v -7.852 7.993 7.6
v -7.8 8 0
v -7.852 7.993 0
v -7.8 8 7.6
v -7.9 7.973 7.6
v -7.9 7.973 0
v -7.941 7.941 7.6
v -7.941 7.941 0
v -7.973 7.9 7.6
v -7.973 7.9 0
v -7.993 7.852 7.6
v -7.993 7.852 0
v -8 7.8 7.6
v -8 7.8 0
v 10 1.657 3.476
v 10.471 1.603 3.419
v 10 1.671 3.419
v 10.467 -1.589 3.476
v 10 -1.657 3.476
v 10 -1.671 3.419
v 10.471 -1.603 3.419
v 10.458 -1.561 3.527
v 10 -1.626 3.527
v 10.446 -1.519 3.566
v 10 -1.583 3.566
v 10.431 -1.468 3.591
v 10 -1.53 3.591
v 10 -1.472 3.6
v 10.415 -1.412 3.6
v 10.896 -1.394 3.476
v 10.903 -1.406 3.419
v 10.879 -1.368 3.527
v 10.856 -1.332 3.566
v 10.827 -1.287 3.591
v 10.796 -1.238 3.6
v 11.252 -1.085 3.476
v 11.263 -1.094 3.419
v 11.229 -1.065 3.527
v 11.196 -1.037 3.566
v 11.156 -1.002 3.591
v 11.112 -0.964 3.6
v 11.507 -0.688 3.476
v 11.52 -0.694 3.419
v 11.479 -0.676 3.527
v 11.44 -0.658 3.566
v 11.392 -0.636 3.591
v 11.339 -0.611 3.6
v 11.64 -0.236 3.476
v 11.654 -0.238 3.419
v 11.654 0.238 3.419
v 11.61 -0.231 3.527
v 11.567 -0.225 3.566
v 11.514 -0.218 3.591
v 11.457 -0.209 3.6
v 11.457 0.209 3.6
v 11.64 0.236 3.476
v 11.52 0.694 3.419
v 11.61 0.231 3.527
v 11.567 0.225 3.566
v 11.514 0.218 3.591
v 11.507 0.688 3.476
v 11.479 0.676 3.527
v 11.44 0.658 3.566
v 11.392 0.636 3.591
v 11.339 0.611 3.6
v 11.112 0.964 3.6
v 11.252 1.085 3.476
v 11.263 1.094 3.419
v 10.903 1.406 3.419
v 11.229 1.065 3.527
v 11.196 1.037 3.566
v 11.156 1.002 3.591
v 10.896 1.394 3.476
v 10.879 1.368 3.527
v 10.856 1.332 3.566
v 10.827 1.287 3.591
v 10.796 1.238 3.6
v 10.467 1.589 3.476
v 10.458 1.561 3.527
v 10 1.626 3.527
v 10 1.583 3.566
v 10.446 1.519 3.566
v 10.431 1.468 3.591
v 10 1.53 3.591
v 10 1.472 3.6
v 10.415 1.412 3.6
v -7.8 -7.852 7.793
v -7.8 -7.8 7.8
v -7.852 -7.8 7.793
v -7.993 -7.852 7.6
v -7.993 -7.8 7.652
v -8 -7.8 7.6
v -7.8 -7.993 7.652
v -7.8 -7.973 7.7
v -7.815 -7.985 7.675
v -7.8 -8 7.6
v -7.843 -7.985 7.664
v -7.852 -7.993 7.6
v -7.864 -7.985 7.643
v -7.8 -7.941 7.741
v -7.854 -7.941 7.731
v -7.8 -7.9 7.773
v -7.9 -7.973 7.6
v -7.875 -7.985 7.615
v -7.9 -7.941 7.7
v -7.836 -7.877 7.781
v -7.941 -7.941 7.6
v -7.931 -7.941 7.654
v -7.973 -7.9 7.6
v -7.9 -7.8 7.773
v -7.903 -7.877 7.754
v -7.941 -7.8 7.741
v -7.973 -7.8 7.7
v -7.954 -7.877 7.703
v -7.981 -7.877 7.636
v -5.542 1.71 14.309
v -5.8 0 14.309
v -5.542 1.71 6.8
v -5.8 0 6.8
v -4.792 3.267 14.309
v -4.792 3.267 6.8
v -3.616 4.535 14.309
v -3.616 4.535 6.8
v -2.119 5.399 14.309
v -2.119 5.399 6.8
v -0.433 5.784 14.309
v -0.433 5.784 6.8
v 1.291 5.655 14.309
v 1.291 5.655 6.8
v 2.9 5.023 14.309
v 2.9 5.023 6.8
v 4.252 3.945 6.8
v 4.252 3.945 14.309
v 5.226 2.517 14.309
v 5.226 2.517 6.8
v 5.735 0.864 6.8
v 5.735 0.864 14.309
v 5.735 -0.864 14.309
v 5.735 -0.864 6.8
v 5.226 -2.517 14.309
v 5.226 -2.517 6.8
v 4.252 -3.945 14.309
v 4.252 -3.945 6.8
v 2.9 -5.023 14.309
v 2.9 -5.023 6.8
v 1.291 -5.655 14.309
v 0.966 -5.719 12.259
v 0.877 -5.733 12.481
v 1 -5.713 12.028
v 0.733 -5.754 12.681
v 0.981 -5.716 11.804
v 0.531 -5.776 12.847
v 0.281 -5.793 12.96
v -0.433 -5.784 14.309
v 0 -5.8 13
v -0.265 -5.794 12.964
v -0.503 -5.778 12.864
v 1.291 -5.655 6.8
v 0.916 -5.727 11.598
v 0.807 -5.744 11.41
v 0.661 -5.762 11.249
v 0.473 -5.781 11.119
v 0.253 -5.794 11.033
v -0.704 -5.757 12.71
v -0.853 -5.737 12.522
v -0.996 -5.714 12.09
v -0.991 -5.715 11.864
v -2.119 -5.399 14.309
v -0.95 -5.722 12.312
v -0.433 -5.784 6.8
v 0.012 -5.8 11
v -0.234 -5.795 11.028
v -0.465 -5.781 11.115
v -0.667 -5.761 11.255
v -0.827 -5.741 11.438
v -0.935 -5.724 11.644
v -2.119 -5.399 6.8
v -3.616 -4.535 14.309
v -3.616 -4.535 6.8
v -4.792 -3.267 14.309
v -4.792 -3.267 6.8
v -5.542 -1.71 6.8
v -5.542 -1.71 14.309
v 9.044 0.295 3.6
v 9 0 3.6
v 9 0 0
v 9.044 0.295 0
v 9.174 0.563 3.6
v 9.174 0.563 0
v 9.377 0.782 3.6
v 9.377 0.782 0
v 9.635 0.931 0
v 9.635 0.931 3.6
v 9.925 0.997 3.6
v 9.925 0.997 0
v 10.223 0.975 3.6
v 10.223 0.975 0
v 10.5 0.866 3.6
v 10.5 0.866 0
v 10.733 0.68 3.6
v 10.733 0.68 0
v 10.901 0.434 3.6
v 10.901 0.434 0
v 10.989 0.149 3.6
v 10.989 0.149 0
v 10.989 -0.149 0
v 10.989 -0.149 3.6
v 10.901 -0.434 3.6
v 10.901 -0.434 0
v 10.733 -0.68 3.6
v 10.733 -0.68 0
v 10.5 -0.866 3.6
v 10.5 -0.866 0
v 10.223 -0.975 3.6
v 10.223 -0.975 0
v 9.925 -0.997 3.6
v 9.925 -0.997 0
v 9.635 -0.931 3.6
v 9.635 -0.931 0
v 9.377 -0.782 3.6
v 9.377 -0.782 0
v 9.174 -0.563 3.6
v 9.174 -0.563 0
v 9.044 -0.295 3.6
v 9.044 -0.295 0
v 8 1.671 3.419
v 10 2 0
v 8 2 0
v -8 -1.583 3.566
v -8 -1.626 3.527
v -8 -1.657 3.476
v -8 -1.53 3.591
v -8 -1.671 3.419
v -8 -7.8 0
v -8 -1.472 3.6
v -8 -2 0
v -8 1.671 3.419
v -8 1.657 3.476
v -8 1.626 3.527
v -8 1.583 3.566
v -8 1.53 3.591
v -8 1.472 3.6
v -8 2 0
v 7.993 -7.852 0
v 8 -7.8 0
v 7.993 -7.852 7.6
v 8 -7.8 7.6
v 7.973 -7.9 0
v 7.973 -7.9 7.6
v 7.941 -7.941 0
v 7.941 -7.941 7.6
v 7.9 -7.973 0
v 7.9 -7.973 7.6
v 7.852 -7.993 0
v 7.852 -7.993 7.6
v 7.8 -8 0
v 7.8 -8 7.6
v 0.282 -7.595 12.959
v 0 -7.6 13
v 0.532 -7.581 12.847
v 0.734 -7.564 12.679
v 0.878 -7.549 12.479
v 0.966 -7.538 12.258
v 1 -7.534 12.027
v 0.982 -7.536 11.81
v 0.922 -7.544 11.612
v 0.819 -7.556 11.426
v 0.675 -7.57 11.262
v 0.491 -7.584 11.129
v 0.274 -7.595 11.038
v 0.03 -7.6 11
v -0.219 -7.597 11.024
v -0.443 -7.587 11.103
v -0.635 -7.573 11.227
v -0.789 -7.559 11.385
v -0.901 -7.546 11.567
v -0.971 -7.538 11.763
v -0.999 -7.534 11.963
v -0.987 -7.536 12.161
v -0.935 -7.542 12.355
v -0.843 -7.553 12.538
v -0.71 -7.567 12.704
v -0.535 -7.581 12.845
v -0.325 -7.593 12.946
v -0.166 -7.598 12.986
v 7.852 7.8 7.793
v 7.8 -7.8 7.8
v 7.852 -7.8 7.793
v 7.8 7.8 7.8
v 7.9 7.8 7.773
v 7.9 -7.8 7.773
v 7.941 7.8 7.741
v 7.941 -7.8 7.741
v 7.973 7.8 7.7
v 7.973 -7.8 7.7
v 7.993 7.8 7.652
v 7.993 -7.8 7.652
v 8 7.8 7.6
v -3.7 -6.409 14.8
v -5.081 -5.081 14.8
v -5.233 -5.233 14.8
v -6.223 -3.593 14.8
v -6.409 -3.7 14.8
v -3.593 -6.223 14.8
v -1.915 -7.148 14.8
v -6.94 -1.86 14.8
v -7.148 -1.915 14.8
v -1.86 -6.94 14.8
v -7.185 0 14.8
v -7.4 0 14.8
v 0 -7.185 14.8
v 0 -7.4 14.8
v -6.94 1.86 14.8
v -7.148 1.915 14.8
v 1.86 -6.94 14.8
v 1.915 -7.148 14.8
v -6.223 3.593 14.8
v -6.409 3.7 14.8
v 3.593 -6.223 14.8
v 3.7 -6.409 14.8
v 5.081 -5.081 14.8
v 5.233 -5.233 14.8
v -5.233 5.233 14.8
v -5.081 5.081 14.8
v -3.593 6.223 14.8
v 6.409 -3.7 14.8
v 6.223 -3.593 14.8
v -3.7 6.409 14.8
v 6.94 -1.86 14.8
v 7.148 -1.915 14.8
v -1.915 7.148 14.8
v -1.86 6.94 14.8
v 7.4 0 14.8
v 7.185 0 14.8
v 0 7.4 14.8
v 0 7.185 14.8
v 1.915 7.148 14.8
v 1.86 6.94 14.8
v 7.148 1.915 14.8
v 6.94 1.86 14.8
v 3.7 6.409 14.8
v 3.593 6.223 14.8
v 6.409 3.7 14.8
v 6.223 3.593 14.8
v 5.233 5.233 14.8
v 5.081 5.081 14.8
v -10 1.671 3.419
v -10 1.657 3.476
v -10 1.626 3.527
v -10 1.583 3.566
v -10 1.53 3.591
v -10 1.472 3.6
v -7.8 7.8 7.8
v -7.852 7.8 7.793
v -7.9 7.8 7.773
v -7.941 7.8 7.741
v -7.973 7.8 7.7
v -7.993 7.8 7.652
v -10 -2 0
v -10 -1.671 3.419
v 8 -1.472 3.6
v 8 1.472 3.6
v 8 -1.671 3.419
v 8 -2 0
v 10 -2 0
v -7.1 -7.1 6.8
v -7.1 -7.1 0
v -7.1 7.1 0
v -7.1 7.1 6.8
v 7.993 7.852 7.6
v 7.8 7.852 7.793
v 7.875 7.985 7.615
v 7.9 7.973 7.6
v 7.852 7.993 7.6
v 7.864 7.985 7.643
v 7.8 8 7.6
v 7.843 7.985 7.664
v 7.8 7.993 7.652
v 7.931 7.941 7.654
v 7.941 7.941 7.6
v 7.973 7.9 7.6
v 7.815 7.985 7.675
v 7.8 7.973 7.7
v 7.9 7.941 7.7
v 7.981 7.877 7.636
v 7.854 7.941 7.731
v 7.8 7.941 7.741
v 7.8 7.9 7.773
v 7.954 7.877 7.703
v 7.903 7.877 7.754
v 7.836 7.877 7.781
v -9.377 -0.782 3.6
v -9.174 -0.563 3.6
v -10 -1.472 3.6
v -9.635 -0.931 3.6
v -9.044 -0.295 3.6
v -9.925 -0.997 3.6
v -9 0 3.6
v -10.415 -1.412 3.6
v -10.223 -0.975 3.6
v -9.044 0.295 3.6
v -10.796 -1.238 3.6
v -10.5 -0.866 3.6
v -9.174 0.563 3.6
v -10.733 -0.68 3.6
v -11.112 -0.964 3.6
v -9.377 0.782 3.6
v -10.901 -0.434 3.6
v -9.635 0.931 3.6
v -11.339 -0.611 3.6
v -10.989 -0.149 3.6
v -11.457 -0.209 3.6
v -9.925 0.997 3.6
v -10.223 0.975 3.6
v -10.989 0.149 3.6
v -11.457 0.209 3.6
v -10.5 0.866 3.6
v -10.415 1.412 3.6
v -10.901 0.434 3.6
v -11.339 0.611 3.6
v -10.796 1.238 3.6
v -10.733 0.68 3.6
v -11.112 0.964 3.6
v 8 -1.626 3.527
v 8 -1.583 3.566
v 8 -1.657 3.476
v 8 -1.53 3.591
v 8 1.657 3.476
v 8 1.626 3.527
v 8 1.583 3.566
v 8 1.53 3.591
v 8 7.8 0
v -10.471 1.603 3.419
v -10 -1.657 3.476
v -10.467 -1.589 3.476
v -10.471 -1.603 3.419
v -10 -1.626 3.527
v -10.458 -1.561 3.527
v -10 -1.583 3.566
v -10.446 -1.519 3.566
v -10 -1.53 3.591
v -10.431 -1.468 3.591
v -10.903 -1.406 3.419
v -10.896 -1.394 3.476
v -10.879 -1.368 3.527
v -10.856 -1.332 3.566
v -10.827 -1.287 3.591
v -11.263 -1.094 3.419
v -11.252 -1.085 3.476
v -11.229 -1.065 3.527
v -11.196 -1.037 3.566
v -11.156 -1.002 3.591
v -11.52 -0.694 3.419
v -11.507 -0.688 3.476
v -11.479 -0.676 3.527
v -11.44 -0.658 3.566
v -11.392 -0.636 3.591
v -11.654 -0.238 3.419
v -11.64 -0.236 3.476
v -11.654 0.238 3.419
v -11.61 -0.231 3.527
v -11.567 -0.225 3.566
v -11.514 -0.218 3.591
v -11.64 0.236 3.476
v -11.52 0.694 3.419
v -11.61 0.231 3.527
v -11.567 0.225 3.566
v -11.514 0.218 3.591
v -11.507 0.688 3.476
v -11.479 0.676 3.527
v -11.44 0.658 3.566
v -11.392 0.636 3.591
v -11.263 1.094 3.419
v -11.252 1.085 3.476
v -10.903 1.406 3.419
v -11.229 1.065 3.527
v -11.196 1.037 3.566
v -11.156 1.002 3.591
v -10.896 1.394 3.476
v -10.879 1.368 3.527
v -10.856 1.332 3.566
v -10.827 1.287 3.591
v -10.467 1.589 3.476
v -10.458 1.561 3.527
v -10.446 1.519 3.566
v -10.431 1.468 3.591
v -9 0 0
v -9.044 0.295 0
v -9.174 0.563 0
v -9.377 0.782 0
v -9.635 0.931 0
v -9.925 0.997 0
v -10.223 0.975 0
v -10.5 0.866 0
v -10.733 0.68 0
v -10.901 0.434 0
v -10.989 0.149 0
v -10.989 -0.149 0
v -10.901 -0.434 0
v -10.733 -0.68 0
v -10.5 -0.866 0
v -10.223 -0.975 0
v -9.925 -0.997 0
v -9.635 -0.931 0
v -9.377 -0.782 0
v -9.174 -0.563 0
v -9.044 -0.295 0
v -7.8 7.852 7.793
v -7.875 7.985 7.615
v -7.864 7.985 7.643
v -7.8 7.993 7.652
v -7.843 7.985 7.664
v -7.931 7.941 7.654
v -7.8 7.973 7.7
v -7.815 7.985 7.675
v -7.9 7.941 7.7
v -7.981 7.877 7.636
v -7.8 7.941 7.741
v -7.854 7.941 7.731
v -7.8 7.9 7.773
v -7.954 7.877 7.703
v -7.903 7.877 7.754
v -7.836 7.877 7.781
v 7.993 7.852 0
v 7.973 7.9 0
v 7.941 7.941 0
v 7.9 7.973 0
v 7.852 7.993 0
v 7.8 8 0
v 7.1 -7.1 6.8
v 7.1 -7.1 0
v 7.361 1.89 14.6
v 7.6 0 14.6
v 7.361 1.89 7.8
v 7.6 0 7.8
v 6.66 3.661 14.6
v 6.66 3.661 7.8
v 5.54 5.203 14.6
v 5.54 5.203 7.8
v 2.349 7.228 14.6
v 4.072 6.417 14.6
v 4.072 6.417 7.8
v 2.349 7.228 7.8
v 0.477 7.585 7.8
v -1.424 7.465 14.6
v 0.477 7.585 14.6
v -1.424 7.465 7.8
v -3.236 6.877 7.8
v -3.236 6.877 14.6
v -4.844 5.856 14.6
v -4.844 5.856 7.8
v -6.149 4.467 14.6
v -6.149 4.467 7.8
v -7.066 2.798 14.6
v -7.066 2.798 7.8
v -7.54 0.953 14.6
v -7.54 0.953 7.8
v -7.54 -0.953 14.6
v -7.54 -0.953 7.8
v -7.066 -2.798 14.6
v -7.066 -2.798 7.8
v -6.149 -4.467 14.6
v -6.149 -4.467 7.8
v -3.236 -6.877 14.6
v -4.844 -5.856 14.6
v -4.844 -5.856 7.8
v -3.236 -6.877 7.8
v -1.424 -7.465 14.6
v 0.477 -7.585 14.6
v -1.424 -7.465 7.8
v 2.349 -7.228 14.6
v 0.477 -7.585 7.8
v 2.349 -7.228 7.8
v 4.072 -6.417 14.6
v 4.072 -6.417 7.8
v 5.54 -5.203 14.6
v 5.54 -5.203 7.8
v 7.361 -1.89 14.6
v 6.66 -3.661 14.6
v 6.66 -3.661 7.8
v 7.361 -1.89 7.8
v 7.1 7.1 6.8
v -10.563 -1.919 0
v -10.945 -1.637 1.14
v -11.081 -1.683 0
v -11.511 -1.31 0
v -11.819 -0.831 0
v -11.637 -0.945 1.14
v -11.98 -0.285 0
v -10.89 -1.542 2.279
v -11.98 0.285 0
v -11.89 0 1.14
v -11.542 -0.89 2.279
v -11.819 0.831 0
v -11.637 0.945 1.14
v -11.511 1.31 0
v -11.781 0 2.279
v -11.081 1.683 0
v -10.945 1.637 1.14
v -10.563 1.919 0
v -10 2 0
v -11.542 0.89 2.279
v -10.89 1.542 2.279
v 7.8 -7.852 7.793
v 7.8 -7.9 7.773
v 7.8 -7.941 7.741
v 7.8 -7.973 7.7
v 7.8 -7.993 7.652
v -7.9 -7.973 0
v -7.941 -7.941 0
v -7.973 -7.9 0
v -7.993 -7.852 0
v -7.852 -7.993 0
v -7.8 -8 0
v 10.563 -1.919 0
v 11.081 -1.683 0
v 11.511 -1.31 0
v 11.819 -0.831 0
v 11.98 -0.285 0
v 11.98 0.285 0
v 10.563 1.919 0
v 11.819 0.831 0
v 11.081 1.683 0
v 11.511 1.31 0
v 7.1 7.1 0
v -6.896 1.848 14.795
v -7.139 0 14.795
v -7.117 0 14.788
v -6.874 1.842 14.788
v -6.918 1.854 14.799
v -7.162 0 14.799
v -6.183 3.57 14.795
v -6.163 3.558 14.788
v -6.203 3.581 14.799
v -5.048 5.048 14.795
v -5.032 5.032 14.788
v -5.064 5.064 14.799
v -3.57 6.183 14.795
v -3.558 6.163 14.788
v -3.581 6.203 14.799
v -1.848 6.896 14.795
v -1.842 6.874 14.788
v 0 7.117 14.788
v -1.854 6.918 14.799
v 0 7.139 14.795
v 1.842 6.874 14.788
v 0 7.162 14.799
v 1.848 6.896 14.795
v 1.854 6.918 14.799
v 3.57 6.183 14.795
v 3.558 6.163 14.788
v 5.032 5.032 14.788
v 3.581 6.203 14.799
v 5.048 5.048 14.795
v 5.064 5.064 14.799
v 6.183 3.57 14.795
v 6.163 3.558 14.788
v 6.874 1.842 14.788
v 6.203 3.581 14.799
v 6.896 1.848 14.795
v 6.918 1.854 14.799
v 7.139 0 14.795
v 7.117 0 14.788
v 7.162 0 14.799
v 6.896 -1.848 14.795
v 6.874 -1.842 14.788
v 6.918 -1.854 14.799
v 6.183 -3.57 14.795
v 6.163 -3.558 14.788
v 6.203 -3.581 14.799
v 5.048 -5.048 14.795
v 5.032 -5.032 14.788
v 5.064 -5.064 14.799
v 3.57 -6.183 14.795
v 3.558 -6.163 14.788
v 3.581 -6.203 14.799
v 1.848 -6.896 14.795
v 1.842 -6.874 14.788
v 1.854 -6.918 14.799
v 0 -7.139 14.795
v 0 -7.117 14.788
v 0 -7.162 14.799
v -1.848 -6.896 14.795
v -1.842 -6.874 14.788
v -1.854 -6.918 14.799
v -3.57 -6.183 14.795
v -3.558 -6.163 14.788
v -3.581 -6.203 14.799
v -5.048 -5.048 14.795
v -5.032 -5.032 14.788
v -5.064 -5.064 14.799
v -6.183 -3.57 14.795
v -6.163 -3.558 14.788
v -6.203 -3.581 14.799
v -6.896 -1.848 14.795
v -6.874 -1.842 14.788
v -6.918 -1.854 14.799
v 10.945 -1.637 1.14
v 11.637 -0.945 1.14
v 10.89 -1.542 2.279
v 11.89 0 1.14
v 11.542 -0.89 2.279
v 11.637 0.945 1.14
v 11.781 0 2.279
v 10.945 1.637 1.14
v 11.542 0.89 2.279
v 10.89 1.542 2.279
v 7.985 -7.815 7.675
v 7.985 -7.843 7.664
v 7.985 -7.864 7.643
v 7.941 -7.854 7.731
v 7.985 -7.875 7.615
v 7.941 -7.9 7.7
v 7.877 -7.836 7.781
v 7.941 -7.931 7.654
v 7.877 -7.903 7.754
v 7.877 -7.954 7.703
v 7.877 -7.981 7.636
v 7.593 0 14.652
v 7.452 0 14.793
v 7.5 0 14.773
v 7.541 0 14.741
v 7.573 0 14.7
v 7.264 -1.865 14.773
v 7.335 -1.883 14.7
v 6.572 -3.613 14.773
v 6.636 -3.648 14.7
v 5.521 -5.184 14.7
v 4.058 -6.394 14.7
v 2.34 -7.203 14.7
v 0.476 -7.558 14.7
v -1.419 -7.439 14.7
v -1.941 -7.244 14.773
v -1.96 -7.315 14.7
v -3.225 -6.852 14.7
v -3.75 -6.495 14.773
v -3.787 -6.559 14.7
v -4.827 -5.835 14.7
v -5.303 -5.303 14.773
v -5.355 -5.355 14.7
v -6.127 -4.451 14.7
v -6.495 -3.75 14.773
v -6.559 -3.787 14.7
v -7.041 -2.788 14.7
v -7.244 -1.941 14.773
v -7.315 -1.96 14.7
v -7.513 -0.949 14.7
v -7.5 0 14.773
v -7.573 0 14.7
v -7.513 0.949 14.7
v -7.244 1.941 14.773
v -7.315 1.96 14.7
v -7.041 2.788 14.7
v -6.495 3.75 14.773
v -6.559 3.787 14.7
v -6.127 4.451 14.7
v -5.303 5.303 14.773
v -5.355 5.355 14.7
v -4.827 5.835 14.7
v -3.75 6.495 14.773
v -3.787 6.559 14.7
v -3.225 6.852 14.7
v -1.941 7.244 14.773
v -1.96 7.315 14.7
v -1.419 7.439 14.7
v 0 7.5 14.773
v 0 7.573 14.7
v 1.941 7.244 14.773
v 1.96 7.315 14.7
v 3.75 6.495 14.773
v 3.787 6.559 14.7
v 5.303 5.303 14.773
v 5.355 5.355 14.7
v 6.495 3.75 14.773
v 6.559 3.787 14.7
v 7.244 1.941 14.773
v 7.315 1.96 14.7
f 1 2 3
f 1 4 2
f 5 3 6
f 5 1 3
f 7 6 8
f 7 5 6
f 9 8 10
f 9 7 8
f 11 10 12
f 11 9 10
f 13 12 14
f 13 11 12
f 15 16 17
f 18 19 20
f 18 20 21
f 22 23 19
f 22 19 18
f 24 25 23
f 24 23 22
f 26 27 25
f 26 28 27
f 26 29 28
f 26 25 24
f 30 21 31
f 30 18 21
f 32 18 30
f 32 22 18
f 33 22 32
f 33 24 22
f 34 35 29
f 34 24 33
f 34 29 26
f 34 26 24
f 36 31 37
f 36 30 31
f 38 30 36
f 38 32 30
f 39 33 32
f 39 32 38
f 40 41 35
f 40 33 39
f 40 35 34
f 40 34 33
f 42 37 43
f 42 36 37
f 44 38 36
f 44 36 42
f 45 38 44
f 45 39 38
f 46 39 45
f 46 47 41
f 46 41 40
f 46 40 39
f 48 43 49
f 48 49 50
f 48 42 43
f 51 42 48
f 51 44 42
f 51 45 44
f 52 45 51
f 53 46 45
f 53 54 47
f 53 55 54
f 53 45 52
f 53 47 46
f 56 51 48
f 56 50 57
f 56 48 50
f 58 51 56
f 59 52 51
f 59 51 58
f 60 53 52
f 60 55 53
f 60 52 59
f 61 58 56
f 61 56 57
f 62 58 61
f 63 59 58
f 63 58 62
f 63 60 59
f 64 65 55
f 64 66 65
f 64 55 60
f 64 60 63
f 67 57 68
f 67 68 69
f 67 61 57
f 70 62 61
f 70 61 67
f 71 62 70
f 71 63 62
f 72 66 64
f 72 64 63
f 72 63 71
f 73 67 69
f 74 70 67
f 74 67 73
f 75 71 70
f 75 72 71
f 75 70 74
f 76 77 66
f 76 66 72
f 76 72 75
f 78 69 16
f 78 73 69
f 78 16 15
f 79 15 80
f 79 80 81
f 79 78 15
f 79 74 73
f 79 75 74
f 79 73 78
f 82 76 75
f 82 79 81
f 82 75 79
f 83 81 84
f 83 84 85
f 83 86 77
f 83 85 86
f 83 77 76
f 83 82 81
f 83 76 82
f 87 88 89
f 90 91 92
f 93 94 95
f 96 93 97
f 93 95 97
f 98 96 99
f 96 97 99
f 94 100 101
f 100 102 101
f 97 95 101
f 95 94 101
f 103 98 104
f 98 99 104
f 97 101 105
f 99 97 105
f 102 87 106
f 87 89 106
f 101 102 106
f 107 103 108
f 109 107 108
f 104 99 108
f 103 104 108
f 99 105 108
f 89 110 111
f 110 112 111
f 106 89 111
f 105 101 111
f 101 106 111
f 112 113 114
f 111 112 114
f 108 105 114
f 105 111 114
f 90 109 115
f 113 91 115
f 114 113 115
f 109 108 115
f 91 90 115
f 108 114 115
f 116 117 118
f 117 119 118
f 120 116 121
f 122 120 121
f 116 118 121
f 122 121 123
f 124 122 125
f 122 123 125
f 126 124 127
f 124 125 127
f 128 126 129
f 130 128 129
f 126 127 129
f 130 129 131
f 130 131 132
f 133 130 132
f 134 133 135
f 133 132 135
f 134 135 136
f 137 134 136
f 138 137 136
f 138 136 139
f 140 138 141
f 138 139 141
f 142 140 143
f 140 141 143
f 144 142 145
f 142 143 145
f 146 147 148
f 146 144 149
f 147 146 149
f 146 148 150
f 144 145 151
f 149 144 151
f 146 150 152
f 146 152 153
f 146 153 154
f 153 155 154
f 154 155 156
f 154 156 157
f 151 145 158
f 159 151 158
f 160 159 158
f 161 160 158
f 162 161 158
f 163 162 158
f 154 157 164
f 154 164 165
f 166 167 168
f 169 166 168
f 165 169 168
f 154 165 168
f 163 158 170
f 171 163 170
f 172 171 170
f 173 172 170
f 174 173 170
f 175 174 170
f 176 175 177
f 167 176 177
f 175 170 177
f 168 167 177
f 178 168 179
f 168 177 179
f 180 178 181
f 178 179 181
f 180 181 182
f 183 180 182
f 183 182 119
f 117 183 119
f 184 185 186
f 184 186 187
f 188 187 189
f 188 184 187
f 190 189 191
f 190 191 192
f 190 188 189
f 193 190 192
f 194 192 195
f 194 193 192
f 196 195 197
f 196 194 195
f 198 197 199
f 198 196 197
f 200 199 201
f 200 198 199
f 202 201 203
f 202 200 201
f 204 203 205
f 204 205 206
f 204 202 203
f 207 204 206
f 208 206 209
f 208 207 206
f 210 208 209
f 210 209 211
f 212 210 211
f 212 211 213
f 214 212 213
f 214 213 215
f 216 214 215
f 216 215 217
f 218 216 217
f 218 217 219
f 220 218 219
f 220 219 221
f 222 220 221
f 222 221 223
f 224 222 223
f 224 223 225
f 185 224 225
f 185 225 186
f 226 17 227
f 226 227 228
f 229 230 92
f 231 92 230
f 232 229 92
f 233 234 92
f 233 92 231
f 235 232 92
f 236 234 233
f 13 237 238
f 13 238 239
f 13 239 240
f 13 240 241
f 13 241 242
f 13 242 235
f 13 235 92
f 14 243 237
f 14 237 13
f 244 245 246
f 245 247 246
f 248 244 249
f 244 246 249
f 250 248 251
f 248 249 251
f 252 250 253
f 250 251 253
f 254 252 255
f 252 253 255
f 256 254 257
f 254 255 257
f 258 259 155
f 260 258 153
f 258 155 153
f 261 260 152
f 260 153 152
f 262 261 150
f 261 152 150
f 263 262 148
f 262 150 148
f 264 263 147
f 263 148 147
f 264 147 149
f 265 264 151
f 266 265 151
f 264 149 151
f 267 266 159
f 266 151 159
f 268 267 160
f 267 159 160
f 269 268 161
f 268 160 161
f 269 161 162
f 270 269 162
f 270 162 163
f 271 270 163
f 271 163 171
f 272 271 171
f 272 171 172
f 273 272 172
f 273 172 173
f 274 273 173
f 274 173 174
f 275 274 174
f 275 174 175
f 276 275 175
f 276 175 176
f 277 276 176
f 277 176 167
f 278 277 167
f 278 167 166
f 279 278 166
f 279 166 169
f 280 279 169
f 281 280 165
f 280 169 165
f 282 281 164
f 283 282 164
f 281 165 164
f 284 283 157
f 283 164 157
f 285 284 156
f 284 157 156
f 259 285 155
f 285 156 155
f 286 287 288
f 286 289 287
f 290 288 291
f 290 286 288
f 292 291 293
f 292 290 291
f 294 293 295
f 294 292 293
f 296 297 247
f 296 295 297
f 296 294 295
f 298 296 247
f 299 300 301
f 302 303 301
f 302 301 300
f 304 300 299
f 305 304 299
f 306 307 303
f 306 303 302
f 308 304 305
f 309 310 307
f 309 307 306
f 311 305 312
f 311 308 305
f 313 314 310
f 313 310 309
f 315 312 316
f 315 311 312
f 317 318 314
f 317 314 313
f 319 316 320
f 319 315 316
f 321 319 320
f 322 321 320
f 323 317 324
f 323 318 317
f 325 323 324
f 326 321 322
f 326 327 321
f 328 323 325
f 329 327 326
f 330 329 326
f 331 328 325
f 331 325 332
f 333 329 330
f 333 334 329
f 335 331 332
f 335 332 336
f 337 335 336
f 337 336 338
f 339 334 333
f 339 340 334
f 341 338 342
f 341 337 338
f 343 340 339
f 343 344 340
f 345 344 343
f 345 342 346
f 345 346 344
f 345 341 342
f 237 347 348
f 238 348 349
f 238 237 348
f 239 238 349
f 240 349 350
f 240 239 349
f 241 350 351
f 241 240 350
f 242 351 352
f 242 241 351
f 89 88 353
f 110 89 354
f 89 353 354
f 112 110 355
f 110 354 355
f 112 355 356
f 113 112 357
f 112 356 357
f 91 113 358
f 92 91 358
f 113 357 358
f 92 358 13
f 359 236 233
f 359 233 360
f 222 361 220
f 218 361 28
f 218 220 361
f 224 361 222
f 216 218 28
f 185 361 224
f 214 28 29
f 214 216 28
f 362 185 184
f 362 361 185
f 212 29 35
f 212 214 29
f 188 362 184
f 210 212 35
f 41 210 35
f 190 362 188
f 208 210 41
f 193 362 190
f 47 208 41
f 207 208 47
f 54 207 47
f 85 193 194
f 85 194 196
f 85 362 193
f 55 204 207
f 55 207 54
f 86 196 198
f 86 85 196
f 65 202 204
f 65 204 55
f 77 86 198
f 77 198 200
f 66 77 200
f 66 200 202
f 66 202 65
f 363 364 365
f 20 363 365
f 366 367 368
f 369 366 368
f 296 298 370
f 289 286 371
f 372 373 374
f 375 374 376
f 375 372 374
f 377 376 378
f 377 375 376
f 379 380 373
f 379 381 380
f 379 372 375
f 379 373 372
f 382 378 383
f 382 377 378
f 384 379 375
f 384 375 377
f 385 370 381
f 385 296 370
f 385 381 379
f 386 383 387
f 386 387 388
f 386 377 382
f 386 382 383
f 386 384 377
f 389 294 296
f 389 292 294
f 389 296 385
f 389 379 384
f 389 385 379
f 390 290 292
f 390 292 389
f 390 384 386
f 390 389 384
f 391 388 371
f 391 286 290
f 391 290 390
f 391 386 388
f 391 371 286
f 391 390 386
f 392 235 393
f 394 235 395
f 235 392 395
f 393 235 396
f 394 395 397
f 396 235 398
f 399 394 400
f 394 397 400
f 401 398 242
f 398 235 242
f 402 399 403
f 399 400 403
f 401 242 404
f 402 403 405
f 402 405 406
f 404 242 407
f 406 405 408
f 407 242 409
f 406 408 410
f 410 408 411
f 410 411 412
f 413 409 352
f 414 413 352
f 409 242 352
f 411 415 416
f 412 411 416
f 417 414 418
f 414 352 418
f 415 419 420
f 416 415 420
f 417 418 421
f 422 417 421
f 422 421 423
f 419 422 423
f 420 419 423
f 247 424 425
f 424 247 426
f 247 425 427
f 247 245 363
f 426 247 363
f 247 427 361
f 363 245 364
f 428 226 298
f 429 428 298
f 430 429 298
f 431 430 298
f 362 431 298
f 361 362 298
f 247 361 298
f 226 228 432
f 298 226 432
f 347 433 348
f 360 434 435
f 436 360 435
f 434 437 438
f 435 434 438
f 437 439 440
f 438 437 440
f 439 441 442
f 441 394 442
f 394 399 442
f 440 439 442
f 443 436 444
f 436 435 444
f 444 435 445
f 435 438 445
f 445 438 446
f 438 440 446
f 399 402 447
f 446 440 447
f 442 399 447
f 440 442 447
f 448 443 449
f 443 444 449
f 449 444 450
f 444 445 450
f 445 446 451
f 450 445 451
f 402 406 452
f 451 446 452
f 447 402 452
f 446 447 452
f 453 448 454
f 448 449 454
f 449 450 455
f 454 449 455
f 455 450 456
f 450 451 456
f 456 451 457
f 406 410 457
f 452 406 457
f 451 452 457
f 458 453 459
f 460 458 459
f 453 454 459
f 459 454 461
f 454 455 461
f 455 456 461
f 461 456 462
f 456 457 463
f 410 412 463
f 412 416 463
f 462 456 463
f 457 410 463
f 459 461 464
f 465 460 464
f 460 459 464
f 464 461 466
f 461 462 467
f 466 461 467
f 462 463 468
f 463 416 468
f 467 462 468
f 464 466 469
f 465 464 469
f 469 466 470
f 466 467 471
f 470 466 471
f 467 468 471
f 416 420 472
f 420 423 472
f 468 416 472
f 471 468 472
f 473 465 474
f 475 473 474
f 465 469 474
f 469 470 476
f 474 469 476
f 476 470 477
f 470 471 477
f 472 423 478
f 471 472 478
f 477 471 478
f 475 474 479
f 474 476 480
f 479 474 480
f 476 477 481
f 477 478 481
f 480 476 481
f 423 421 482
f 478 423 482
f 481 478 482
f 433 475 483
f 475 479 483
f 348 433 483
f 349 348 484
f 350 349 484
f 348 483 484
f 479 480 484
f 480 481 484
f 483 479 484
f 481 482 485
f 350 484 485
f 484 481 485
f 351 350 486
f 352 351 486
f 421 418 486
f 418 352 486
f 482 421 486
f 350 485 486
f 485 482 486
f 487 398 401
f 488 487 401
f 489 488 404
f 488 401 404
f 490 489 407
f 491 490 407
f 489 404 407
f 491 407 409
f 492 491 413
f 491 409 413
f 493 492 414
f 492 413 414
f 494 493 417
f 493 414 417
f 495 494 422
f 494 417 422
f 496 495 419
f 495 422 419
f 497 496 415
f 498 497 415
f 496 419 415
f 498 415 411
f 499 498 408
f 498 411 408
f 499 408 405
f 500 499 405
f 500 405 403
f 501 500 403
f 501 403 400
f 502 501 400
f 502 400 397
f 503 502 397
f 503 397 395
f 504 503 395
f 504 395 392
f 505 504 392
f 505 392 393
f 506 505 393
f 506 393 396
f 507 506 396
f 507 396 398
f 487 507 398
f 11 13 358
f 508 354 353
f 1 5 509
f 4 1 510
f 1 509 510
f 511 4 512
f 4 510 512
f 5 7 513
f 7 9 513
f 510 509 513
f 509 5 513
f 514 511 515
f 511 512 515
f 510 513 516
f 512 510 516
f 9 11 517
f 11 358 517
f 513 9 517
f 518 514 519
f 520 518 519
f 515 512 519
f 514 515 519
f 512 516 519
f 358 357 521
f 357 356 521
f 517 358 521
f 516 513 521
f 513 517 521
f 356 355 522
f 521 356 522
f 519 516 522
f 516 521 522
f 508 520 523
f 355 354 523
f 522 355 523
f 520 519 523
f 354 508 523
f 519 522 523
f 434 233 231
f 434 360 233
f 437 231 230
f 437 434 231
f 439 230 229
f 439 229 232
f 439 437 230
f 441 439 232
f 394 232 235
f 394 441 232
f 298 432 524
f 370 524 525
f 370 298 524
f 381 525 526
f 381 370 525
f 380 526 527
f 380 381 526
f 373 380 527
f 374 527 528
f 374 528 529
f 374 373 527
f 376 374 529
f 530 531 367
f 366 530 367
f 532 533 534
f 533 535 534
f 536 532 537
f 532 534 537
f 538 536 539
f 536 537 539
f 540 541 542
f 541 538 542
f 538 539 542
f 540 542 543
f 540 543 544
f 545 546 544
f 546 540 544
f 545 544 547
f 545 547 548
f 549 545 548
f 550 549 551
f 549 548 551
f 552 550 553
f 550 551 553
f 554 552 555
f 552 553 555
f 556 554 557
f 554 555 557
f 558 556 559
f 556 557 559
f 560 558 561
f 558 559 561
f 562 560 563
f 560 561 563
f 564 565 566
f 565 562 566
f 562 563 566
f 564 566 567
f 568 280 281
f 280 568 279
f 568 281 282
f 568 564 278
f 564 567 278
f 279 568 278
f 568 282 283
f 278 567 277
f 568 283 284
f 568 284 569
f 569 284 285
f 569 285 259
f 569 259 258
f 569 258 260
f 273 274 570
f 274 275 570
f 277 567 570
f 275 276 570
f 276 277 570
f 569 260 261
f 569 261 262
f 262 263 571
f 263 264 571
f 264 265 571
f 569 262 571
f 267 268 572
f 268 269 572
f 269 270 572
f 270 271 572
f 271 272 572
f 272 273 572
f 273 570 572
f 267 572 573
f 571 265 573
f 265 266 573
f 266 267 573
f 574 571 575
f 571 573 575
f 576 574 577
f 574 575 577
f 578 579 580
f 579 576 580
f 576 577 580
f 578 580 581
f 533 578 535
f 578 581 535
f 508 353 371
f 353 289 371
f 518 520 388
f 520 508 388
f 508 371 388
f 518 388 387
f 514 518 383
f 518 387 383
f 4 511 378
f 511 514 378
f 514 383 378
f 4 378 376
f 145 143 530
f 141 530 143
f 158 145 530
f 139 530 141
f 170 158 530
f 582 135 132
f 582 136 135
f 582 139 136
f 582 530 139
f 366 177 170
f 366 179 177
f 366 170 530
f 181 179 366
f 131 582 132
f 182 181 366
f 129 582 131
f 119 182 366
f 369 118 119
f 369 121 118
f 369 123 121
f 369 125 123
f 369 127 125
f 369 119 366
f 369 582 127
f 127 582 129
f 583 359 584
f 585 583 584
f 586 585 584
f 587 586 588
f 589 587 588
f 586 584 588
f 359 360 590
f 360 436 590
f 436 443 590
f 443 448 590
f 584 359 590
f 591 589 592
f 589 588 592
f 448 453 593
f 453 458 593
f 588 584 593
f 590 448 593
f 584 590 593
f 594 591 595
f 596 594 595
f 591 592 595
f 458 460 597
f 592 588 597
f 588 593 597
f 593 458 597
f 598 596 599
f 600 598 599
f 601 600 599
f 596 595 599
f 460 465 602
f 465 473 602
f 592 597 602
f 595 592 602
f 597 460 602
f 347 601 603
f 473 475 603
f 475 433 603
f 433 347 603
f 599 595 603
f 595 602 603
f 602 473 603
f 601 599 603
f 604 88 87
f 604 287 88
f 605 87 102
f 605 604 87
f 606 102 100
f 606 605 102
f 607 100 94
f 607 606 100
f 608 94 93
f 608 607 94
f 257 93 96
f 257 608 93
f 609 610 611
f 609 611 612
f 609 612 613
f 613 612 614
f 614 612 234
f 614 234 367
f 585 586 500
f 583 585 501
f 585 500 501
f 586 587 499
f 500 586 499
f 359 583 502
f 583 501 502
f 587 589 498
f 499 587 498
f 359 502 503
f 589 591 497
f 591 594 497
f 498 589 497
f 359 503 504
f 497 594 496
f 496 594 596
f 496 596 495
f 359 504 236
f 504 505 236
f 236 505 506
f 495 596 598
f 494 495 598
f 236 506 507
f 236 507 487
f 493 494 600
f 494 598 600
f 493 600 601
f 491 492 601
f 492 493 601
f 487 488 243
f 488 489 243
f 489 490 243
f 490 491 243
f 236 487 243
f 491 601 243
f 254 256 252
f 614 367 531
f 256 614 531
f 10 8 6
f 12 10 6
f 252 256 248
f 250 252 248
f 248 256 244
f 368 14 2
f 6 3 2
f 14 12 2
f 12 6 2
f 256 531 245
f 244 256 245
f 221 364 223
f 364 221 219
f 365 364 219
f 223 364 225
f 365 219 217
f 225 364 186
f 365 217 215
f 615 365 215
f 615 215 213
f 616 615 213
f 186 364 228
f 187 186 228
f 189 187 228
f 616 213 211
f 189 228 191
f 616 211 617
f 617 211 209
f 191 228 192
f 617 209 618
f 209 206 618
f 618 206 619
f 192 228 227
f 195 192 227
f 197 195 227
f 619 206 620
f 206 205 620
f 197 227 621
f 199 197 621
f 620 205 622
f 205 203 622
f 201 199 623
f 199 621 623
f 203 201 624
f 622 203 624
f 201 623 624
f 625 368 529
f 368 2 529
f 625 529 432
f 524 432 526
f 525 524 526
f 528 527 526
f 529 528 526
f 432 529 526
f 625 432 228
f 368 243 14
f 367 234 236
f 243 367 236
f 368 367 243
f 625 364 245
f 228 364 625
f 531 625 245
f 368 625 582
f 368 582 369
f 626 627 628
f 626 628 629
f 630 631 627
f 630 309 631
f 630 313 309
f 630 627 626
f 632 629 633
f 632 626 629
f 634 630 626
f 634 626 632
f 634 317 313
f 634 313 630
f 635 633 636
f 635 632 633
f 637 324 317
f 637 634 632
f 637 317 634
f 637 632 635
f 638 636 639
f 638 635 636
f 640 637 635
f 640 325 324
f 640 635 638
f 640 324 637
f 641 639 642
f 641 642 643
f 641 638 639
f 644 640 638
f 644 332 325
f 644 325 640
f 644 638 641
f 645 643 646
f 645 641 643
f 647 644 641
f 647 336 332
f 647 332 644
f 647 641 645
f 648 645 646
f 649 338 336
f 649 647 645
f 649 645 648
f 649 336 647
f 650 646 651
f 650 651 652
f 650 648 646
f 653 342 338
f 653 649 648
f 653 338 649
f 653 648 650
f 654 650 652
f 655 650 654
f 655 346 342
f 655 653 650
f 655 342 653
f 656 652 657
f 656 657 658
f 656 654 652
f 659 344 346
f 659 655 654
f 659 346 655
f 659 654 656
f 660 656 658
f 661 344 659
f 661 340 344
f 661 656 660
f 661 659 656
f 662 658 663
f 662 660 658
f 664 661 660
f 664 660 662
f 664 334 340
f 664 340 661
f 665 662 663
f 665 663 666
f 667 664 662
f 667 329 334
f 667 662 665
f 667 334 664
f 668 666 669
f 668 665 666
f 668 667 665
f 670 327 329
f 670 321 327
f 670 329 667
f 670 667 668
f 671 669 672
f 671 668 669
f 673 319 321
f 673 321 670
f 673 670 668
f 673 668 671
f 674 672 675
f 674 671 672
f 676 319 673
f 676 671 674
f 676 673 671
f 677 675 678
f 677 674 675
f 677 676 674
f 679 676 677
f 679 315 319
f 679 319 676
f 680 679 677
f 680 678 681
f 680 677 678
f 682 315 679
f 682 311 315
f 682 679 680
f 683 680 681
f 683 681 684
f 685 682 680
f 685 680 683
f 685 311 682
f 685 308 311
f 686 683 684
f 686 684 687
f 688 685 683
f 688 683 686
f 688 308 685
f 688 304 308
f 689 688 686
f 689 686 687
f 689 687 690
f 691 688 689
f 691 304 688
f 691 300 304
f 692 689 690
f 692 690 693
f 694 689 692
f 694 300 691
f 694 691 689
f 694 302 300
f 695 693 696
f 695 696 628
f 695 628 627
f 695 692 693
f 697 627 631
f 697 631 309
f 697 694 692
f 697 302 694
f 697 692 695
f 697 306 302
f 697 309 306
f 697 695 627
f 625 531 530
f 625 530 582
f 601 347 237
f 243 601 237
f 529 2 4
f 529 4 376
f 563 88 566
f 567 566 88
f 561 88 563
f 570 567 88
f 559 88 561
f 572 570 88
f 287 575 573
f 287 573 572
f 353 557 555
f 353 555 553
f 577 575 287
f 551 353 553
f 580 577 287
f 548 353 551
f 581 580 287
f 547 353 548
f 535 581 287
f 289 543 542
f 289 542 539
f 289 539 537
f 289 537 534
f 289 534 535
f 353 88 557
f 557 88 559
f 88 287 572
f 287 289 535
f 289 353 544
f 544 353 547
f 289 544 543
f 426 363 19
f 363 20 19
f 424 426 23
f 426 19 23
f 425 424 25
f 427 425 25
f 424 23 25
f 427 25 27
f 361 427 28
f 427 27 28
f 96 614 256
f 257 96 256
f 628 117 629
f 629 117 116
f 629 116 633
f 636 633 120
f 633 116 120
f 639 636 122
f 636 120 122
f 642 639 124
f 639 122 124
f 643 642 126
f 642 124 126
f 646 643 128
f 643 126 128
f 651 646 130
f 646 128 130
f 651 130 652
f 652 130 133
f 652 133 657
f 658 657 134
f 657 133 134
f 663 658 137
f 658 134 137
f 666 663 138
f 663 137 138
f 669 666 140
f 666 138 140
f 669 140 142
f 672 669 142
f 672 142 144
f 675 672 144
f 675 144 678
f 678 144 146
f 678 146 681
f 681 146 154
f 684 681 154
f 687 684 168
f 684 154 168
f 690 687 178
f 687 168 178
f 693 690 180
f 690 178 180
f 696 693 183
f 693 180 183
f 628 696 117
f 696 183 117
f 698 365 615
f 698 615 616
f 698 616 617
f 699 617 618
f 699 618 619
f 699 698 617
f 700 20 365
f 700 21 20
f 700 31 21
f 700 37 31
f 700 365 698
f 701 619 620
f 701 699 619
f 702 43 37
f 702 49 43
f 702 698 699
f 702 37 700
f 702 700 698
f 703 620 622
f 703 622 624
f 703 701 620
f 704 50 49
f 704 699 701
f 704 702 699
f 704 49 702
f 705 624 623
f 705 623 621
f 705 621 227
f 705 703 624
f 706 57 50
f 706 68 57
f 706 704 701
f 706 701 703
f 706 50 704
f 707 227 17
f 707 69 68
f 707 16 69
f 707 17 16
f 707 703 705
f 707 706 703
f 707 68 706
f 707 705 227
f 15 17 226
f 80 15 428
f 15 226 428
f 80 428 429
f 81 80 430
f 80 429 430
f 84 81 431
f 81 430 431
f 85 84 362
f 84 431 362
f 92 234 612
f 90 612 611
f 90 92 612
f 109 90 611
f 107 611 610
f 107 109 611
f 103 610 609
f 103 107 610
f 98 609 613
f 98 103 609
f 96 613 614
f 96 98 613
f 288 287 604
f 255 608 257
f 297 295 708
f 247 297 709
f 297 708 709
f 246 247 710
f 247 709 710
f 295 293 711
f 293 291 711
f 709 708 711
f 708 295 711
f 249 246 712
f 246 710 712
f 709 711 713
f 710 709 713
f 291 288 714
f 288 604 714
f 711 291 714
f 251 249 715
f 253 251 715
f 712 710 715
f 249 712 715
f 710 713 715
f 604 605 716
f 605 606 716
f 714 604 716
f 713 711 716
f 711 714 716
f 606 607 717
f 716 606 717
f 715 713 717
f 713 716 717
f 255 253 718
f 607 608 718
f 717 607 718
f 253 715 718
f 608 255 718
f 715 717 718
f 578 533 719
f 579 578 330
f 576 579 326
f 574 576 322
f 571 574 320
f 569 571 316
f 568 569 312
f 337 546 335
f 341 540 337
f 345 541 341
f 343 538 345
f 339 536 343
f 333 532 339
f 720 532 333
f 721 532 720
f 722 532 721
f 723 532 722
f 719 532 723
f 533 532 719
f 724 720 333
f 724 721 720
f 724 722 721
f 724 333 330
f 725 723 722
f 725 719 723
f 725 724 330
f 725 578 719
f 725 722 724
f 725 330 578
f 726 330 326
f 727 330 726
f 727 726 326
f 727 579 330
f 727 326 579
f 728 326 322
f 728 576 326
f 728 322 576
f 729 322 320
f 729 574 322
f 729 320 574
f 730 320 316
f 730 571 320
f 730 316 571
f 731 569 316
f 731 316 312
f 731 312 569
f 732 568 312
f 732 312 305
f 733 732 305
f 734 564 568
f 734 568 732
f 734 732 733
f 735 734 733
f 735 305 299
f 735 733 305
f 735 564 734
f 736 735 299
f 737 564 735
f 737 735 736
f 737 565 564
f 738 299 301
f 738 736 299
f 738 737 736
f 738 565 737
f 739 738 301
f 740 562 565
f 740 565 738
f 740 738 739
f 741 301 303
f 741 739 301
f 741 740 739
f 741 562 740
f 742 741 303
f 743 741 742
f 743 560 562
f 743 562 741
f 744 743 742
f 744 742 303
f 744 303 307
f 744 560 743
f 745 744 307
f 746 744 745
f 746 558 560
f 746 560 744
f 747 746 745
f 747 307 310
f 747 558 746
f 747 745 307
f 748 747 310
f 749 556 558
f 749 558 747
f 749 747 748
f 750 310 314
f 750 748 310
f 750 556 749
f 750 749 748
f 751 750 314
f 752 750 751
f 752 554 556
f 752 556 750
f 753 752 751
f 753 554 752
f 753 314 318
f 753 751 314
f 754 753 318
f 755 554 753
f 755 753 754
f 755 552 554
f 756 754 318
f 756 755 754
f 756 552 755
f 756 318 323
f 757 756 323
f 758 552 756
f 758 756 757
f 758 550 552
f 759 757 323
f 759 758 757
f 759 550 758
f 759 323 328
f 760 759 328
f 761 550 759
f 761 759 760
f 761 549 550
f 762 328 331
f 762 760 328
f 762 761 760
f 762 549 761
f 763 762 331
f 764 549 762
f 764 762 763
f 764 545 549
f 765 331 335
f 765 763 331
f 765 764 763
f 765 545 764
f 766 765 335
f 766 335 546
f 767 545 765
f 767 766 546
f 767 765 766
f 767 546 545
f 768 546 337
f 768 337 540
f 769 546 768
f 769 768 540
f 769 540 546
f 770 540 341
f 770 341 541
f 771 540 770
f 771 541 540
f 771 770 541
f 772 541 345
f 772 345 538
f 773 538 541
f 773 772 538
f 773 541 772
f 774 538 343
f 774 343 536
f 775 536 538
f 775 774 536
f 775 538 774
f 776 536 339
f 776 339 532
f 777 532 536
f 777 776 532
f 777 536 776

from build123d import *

# Parameters (mm, degrees)
SKETCH_1_W             = 16
SKETCH_1_H             = 16
EXTRUDE_1_DEPTH        = 7.8
SKETCH_2_R             = 7.6
EXTRUDE_2_DEPTH        = 7
EXTRUDE_3_DEPTH        = 3.6
EXTRUDE_3_TAPER        = 5.5
SKETCH_4_R             = 1
CUT_EXTRUDE_1_DEPTH    = 19.260339646
FILLET_1_R             = 0.2
FILLET_1_OF_MIRROR_1_R = 0.2
SKETCH_5_W             = 14.2
SKETCH_5_H             = 14.2
CUT_EXTRUDE_2_DEPTH    = 6.8
SKETCH_6_R             = 5.8
CUT_EXTRUDE_3_DEPTH    = 17.492422624
CHAMFER_1_SIZE         = 1.35
CHAMFER_1_SIZE2        = 0.491359816
FILLET_2_R             = 0.2
SKETCH_7_R             = 1
CUT_EXTRUDE_4_DEPTH    = 21.664946262
FILLET_3_R             = 0.2


with BuildPart() as part:
    # 草图1 → 凸台-拉伸1 (new body)
    with BuildSketch(Plane.XY):
        Rectangle(SKETCH_1_W, SKETCH_1_H)
    extrude(amount=EXTRUDE_1_DEPTH)

    # 草图2 → 凸台-拉伸2 (add)
    with BuildSketch(Plane.XY.offset(7.8)):
        Circle(SKETCH_2_R)
    extrude(amount=EXTRUDE_2_DEPTH)

    # 草图3 → 凸台-拉伸3 (add)
    with BuildSketch(Plane(origin=(0, 0, 0), x_dir=(-1, 0, 0), z_dir=(0, 0, -1))):
        with BuildLine():
            Line((10, 2), (4, 2))
            Line((4, 2), (4, -2))
            Line((4, -2), (10, -2))
            ThreePointArc((10, -2), (12, 0), (10, 2))
        make_face()
    extrude_3 = extrude(amount=-EXTRUDE_3_DEPTH, taper=EXTRUDE_3_TAPER)

    # 草图4 → 切除-拉伸1 (cut, through all)
    with BuildSketch(Plane.XY.offset(3.6)):
        with Locations((-10, 0)):
            Circle(SKETCH_4_R)
    cut_extrude_1 = extrude(amount=-CUT_EXTRUDE_1_DEPTH, mode=Mode.SUBTRACT)

    # 圆角1
    fillet_1_edges = [part.edges().sort_by_distance(p)[0] for p in [
        (-9, 1.653359426, 3.6),
        (-11.653359426, 0, 3.6),
        (-9, -1.653359426, 3.6),
    ]]
    fillet(fillet_1_edges, radius=FILLET_1_R)

    # 镜向1: 凸台-拉伸3, 切除-拉伸1 across plane
    add(extrude_3.mirror(Plane(origin=(0, 0, 0), x_dir=(0, 0, 1), z_dir=(1, 0, 0))))
    add(cut_extrude_1.mirror(Plane(origin=(0, 0, 0), x_dir=(0, 0, 1), z_dir=(1, 0, 0))), mode=Mode.SUBTRACT)

    # 圆角1 of 镜向1
    fillet_1_of_mirror_1_edges = [part.edges().sort_by_distance(p)[0] for p in [
        (9, 1.653359426, 3.6),
        (11.653359426, 0, 3.6),
        (9, -1.653359426, 3.6),
    ]]
    fillet(fillet_1_of_mirror_1_edges, radius=FILLET_1_OF_MIRROR_1_R)

    # 草图5 → 切除-拉伸2 (cut)
    with BuildSketch(Plane(origin=(0, 0, 0), x_dir=(-1, 0, 0), z_dir=(0, 0, -1))):
        Rectangle(SKETCH_5_W, SKETCH_5_H)
    extrude(amount=-CUT_EXTRUDE_2_DEPTH, mode=Mode.SUBTRACT)

    # 草图6 → 切除-拉伸3 (cut, through all)
    with BuildSketch(Plane(origin=(0, 0, 6.8), x_dir=(-1, 0, 0), z_dir=(0, 0, -1))):
        Circle(SKETCH_6_R)
    extrude(amount=-CUT_EXTRUDE_3_DEPTH, mode=Mode.SUBTRACT)

    # 倒角1
    chamfer_1_edges = [part.edges().sort_by_distance(p)[0] for p in [
        (5.8, 0, 14.8),
    ]]
    chamfer_1_side = [part.faces().sort_by_distance(p)[0] for p in [
        (-7.385039539, 0, 14.8),
    ]]
    chamfer(chamfer_1_edges, length=CHAMFER_1_SIZE, length2=CHAMFER_1_SIZE2, reference=chamfer_1_side[0])

    # 圆角2
    fillet_2_edges = [part.edges().sort_by_distance(p)[0] for p in [
        (-7.6, 0, 14.8),
        (7.15, 0, 14.8),
    ]]
    fillet(fillet_2_edges, radius=FILLET_2_R)

    # 草图7 → 切除-拉伸4 (cut, through all)
    with BuildSketch(Plane(origin=(0, 0, 0), x_dir=(1, 0, 0), z_dir=(0, 1, 0))):
        with Locations((0, -12)):
            Circle(SKETCH_7_R)
    extrude(amount=-CUT_EXTRUDE_4_DEPTH, mode=Mode.SUBTRACT)

    # 圆角3
    fillet_3_edges = [part.edges().sort_by_distance(p)[0] for p in [
        (-8, 0, 7.8),
        (0, 8, 7.8),
        (8, 0, 7.8),
        (0, -8, 7.8),
        (-8, 8, 3.9),
        (8, 8, 3.9),
        (8, -8, 3.9),
        (-8, -8, 3.9),
    ]]
    fillet(fillet_3_edges, radius=FILLET_3_R)


solid = part.part
